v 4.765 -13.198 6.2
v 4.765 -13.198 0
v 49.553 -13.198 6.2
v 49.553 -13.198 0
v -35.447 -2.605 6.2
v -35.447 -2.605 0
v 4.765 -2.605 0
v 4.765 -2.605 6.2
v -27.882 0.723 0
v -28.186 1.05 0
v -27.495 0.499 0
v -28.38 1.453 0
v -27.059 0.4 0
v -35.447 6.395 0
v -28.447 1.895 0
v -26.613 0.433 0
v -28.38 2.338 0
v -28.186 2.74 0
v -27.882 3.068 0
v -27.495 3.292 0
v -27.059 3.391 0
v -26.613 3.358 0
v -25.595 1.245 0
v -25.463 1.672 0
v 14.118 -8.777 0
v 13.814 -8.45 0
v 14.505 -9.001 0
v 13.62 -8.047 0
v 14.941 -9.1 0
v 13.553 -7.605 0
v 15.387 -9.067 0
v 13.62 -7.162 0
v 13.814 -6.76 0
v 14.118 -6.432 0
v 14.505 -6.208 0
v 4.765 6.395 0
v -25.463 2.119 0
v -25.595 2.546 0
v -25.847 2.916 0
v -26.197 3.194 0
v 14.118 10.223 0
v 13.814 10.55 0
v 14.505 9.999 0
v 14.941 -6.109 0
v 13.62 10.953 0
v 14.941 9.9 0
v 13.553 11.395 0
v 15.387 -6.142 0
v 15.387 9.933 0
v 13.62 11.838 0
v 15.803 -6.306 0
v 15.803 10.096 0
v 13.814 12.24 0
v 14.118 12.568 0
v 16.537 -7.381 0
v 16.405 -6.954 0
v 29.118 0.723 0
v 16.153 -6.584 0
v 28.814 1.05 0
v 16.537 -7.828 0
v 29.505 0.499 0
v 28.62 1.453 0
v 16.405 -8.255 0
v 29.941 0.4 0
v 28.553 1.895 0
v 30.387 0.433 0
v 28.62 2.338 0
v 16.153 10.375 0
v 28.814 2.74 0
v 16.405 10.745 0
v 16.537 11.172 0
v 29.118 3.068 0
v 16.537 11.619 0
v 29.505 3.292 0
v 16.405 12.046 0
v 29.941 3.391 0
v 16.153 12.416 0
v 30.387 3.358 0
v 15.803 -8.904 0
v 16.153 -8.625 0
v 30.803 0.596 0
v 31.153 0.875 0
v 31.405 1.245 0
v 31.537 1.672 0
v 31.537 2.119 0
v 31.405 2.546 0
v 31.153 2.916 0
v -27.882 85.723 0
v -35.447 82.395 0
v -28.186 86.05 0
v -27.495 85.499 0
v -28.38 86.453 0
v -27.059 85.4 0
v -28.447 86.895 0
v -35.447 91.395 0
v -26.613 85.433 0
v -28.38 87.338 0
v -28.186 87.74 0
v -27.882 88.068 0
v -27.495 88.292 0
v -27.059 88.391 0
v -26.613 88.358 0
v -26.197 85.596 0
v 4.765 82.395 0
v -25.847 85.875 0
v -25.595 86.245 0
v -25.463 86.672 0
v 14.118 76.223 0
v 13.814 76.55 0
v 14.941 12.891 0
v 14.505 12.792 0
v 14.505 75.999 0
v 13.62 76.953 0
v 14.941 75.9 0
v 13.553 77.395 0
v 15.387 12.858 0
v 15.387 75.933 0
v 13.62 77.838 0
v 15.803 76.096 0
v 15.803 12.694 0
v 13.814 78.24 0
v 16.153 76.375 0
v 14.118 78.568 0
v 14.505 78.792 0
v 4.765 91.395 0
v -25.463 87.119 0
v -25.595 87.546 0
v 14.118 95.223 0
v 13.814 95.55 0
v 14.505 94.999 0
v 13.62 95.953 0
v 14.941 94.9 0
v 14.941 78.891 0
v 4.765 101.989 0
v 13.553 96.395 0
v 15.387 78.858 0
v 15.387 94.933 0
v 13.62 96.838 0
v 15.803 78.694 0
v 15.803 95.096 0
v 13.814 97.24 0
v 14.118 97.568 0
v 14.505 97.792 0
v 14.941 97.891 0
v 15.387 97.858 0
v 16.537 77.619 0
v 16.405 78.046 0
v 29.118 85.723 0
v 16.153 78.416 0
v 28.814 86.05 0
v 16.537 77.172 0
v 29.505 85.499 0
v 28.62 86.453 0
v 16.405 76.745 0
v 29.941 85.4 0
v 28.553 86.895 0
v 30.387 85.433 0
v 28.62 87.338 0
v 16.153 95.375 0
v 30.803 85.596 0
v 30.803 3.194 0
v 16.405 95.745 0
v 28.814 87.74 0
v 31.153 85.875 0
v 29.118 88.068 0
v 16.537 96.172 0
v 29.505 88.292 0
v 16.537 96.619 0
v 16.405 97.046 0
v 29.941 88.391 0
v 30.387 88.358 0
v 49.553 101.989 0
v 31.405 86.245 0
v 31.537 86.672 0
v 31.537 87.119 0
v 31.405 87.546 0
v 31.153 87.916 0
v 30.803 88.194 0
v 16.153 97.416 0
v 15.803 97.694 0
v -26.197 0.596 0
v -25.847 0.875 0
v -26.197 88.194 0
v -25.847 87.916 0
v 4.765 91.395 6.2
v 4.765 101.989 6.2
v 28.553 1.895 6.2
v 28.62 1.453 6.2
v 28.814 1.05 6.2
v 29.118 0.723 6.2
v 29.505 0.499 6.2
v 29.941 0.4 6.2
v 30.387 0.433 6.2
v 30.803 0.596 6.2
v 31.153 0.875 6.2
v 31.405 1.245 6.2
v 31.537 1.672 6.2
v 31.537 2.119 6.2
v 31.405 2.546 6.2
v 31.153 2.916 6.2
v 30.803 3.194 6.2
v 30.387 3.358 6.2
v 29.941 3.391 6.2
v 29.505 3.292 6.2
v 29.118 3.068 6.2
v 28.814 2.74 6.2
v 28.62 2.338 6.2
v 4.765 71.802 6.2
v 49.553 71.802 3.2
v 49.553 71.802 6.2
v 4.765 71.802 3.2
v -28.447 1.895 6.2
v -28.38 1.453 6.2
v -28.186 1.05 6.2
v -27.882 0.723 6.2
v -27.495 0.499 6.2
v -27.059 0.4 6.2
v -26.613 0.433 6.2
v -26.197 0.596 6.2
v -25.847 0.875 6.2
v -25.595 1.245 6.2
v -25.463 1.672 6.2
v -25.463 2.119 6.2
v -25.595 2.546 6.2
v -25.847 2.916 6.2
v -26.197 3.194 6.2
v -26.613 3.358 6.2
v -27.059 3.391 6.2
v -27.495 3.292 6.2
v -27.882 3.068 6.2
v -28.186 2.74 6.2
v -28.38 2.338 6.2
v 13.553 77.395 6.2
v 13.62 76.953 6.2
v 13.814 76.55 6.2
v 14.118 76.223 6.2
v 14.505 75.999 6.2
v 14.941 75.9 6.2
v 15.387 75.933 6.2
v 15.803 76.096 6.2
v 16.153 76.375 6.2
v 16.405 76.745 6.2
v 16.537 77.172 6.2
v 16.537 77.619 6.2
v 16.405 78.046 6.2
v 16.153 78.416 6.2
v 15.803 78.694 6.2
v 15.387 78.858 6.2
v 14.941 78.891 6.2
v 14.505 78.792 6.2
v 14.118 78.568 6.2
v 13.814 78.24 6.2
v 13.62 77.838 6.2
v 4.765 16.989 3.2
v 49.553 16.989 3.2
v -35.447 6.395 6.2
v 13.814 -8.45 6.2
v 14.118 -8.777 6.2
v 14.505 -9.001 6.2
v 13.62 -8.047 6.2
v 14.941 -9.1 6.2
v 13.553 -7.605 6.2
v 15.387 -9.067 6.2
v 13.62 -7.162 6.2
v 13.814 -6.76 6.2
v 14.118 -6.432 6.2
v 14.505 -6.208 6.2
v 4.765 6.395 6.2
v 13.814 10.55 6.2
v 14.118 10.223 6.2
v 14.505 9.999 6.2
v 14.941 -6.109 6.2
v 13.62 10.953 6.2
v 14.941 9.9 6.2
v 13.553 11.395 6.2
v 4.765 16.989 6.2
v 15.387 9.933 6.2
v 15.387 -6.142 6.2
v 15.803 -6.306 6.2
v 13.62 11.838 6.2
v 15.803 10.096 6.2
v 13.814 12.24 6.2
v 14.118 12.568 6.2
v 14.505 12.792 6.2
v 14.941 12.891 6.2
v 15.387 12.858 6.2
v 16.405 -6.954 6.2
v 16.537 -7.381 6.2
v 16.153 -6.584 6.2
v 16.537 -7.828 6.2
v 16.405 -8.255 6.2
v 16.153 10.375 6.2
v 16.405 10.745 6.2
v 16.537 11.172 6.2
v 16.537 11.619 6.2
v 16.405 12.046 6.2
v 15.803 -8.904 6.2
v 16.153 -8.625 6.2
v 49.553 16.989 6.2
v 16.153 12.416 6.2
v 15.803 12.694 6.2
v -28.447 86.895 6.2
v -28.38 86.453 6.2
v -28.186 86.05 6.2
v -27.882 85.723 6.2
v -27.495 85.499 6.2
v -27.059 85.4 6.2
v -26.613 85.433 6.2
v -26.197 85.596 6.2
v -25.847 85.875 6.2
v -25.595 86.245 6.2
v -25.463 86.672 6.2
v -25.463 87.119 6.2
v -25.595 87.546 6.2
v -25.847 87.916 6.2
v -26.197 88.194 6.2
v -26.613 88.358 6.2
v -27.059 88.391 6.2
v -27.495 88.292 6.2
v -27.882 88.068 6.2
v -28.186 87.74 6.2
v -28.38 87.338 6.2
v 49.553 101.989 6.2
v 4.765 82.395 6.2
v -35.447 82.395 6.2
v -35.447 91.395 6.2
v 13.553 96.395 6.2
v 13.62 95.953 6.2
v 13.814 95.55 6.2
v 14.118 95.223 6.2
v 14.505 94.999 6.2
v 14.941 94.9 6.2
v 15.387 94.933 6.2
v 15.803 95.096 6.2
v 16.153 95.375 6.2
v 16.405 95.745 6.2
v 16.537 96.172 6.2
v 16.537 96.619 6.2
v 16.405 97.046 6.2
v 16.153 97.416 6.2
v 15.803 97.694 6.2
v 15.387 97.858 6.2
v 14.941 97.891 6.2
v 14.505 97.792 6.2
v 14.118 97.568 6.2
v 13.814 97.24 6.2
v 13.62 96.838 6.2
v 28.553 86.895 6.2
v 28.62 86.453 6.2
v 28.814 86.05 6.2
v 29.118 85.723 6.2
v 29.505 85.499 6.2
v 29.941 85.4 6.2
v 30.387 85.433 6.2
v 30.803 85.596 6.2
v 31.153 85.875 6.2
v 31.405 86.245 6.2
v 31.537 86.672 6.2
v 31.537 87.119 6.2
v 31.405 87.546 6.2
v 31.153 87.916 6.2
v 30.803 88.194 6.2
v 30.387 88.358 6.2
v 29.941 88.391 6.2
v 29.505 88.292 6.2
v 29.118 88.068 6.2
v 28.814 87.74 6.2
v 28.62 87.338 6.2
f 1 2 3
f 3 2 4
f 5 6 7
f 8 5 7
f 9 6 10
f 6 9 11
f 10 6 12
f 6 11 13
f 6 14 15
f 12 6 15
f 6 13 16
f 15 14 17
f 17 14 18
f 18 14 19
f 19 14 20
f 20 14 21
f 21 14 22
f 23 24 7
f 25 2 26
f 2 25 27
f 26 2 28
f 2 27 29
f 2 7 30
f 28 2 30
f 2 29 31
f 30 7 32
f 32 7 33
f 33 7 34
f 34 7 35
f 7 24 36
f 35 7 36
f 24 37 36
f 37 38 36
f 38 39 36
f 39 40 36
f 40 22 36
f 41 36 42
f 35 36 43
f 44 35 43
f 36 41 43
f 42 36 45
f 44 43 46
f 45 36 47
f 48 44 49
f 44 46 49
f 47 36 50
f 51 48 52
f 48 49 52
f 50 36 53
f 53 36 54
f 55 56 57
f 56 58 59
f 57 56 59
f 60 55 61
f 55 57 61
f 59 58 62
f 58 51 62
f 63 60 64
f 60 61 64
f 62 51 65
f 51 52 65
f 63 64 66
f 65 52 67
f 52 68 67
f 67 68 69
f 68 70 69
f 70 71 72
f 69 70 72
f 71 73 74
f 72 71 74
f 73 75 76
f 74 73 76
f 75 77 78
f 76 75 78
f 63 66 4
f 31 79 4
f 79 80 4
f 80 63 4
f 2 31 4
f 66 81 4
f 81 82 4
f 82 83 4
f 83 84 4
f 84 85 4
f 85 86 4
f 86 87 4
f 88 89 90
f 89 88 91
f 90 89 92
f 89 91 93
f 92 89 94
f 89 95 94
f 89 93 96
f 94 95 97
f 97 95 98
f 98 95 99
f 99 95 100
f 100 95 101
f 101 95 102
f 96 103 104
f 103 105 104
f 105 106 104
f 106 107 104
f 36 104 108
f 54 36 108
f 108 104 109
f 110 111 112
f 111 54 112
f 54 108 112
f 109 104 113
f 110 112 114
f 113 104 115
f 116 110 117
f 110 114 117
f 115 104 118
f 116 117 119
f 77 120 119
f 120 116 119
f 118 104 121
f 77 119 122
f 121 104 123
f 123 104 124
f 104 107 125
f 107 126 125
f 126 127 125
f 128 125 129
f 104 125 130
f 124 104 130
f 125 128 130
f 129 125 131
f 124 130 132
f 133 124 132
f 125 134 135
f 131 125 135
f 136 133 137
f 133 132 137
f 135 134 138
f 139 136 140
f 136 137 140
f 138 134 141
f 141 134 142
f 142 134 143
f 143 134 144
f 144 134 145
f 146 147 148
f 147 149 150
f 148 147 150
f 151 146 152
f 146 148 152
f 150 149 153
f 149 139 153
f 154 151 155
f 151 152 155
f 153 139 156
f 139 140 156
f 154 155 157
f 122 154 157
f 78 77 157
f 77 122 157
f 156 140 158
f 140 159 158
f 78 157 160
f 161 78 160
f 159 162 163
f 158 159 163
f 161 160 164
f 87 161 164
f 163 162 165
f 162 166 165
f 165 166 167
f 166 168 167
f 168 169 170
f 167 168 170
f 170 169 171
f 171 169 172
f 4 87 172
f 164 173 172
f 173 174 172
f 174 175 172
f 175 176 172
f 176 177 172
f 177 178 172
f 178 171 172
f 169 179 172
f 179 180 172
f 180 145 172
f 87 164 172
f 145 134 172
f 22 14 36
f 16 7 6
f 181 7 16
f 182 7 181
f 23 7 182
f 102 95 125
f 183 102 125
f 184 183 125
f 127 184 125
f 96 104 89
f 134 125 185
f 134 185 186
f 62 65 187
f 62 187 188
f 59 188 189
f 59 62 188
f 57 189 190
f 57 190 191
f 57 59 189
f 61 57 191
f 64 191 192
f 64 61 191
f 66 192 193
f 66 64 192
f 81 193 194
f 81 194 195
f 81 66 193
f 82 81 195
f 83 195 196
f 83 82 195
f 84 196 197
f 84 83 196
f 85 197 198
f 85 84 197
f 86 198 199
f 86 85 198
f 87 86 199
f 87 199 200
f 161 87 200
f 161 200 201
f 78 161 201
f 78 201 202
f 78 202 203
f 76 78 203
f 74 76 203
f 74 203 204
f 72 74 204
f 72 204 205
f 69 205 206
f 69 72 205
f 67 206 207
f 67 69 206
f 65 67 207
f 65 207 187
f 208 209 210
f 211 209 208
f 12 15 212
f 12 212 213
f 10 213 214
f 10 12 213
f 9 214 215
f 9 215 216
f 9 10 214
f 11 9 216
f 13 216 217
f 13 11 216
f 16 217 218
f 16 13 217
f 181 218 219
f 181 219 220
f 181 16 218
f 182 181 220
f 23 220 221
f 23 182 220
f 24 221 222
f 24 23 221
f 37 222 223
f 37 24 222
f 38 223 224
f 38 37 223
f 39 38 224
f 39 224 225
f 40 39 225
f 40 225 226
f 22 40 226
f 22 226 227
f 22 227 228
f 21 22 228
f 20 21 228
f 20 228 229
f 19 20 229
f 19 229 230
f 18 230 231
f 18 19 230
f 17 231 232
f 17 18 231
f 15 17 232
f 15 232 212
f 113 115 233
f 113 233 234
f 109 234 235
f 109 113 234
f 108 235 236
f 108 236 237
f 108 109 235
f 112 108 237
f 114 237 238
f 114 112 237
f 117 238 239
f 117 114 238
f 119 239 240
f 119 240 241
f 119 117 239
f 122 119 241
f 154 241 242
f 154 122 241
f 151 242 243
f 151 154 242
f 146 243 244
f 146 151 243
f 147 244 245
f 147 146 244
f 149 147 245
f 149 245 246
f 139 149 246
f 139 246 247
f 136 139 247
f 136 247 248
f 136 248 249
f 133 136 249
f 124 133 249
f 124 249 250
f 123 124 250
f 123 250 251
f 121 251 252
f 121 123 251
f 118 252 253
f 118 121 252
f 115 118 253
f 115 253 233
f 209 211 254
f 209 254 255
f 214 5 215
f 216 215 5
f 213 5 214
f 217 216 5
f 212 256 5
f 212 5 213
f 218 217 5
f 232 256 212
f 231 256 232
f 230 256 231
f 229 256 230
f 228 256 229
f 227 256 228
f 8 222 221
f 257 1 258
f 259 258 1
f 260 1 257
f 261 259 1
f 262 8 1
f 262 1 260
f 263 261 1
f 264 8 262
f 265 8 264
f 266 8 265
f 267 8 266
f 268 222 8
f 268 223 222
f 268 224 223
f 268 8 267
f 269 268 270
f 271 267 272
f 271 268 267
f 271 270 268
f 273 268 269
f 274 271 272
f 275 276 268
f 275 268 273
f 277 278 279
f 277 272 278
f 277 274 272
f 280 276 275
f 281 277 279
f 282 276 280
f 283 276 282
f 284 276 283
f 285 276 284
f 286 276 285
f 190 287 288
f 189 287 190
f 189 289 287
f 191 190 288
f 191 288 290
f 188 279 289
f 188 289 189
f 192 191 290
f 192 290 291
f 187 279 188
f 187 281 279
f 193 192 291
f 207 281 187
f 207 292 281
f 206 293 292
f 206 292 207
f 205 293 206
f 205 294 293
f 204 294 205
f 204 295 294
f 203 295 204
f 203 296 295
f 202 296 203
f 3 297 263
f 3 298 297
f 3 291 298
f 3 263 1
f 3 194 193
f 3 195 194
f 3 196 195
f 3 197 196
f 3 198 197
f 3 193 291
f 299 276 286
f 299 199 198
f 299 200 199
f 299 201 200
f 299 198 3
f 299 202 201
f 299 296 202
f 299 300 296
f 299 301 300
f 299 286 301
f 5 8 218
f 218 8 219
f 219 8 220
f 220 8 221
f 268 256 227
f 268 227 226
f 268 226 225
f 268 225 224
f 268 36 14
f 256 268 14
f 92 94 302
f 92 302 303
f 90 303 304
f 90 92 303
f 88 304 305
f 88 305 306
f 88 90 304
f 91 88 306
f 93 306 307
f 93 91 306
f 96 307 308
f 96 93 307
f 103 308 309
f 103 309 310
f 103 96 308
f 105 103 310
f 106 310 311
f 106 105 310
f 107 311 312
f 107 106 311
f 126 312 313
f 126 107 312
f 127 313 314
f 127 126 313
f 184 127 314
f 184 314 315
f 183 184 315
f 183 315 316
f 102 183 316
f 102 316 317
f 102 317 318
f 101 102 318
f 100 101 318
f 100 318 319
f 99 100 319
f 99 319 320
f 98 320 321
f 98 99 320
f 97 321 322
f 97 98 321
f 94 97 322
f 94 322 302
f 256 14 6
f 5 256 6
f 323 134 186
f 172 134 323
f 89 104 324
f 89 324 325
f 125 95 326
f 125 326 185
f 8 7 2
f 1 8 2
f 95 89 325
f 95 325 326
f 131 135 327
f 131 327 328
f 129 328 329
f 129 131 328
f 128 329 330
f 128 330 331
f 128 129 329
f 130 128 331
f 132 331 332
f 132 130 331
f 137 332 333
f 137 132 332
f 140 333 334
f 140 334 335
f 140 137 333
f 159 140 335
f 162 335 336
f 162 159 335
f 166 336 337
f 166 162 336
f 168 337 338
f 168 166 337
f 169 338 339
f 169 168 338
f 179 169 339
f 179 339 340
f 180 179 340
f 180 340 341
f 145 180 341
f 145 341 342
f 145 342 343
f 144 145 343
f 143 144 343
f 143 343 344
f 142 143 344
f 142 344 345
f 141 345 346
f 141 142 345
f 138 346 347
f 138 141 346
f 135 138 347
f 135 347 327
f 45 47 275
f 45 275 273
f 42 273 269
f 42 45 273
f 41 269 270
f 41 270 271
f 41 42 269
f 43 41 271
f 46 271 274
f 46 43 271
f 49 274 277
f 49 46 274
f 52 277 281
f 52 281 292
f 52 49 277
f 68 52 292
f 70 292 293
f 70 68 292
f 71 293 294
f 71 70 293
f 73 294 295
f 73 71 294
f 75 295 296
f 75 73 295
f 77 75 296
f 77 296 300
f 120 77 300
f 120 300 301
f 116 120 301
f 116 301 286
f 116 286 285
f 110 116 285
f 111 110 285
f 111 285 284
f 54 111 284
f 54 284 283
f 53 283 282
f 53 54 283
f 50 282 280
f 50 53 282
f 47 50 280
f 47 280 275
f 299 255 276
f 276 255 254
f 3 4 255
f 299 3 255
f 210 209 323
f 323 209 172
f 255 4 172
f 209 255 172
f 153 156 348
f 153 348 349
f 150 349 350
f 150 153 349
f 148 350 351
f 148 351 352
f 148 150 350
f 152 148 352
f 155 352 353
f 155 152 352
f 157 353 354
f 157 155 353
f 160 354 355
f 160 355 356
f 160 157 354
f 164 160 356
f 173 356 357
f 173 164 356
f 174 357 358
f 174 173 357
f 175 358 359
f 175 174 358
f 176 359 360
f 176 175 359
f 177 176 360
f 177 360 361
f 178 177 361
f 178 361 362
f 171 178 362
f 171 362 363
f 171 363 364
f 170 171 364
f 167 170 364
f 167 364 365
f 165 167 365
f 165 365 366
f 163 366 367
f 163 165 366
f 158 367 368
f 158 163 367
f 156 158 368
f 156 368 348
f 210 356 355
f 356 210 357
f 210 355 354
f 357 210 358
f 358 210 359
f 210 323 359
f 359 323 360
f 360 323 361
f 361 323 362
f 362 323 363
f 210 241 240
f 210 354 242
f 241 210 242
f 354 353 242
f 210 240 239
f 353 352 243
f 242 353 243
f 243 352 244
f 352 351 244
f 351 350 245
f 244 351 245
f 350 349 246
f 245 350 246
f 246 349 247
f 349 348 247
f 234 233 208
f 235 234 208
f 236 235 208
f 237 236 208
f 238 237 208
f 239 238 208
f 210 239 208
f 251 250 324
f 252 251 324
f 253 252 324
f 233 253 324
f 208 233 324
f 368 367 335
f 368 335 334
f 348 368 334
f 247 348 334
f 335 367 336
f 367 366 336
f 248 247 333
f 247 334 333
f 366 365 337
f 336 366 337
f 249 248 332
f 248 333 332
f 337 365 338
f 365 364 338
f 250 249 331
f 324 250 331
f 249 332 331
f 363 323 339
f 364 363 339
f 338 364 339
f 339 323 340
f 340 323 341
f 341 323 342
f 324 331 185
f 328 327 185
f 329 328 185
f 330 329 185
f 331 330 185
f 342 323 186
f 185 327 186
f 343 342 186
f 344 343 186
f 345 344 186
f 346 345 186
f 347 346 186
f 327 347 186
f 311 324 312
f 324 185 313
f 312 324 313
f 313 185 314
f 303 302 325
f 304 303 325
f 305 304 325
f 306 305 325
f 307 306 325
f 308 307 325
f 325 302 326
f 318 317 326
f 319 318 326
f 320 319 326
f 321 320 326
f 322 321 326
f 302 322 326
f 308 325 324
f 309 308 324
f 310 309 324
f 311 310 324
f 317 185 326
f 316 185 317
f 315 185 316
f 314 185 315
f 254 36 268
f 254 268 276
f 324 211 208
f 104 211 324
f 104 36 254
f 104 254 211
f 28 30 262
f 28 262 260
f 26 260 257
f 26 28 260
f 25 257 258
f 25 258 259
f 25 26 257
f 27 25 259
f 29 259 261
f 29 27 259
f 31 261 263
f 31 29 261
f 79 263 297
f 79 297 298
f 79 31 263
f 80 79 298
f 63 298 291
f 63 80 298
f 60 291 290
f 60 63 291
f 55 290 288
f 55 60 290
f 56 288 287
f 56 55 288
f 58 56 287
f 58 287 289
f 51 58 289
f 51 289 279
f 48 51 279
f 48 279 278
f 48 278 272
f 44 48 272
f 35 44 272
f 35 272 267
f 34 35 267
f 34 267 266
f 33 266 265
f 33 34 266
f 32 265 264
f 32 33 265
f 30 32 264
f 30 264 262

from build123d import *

# Parameters (mm, degrees)
ESBO_O1_R                  = 1.5
RESSALTO_EXTRUS_O3_DEPTH   = 6.2
RESSALTO_EXTRUS_O3_2_DEPTH = 6.2
ESBO_O1_7_W                = 44.78884621
ESBO_O1_7_H                = 54.813199192
RESSALTO_EXTRUS_O4_DEPTH   = 3.2


with BuildPart() as part:
    # Esboço1 → Ressalto-extrusão3 (new body)
    with BuildSketch(Plane.XY):
        Polygon((49.553364079, 16.988852919), (4.764517869, 16.988852919), (4.764517869, 6.395452515), (-35.446635921, 6.395452515), (-35.446635921, -2.604547485), (4.764517869, -2.604547485), (4.764517869, -13.197947889), (49.553364079, -13.197947889), align=None)
        with Locations((-26.946635921, 1.895452515)):
            Circle(ESBO_O1_R, mode=Mode.SUBTRACT)
        with Locations((15.053364079, -7.604547485)):
            Circle(ESBO_O1_R, mode=Mode.SUBTRACT)
        with Locations((15.053364079, 11.395452515)):
            Circle(ESBO_O1_R, mode=Mode.SUBTRACT)
        with Locations((30.053364079, 1.895452515)):
            Circle(ESBO_O1_R, mode=Mode.SUBTRACT)
    extrude(amount=RESSALTO_EXTRUS_O3_DEPTH)



with BuildPart() as body_2:
    # Esboço1 → Ressalto-extrus_o3 2 (new body)
    with BuildSketch(Plane.XY):
        Polygon((4.764517869, 82.395452515), (4.764517869, 71.802052111), (49.553364079, 71.802052111), (49.553364079, 101.988852919), (4.764517869, 101.988852919), (4.764517869, 91.395452515), (-35.446635921, 91.395452515), (-35.446635921, 82.395452515), align=None)
        with Locations((-26.946635921, 86.895452515)):
            Circle(ESBO_O1_R, mode=Mode.SUBTRACT)
        with Locations((15.053364079, 77.395452515)):
            Circle(ESBO_O1_R, mode=Mode.SUBTRACT)
        with Locations((15.053364079, 96.395452515)):
            Circle(ESBO_O1_R, mode=Mode.SUBTRACT)
        with Locations((30.053364079, 86.895452515)):
            Circle(ESBO_O1_R, mode=Mode.SUBTRACT)
    extrude(amount=RESSALTO_EXTRUS_O3_2_DEPTH)


with BuildPart() as part_1:
    add(part.part)

    add(body_2.part)  # Ressalto-extrusão4 merges body 2
    # Esboço1<7> → Ressalto-extrusão4 (add)
    with BuildSketch(Plane.XY):
        with Locations((27.158940974, 44.395452515)):
            Rectangle(ESBO_O1_7_W, ESBO_O1_7_H)
    extrude(amount=RESSALTO_EXTRUS_O4_DEPTH)


solid = part_1.part
